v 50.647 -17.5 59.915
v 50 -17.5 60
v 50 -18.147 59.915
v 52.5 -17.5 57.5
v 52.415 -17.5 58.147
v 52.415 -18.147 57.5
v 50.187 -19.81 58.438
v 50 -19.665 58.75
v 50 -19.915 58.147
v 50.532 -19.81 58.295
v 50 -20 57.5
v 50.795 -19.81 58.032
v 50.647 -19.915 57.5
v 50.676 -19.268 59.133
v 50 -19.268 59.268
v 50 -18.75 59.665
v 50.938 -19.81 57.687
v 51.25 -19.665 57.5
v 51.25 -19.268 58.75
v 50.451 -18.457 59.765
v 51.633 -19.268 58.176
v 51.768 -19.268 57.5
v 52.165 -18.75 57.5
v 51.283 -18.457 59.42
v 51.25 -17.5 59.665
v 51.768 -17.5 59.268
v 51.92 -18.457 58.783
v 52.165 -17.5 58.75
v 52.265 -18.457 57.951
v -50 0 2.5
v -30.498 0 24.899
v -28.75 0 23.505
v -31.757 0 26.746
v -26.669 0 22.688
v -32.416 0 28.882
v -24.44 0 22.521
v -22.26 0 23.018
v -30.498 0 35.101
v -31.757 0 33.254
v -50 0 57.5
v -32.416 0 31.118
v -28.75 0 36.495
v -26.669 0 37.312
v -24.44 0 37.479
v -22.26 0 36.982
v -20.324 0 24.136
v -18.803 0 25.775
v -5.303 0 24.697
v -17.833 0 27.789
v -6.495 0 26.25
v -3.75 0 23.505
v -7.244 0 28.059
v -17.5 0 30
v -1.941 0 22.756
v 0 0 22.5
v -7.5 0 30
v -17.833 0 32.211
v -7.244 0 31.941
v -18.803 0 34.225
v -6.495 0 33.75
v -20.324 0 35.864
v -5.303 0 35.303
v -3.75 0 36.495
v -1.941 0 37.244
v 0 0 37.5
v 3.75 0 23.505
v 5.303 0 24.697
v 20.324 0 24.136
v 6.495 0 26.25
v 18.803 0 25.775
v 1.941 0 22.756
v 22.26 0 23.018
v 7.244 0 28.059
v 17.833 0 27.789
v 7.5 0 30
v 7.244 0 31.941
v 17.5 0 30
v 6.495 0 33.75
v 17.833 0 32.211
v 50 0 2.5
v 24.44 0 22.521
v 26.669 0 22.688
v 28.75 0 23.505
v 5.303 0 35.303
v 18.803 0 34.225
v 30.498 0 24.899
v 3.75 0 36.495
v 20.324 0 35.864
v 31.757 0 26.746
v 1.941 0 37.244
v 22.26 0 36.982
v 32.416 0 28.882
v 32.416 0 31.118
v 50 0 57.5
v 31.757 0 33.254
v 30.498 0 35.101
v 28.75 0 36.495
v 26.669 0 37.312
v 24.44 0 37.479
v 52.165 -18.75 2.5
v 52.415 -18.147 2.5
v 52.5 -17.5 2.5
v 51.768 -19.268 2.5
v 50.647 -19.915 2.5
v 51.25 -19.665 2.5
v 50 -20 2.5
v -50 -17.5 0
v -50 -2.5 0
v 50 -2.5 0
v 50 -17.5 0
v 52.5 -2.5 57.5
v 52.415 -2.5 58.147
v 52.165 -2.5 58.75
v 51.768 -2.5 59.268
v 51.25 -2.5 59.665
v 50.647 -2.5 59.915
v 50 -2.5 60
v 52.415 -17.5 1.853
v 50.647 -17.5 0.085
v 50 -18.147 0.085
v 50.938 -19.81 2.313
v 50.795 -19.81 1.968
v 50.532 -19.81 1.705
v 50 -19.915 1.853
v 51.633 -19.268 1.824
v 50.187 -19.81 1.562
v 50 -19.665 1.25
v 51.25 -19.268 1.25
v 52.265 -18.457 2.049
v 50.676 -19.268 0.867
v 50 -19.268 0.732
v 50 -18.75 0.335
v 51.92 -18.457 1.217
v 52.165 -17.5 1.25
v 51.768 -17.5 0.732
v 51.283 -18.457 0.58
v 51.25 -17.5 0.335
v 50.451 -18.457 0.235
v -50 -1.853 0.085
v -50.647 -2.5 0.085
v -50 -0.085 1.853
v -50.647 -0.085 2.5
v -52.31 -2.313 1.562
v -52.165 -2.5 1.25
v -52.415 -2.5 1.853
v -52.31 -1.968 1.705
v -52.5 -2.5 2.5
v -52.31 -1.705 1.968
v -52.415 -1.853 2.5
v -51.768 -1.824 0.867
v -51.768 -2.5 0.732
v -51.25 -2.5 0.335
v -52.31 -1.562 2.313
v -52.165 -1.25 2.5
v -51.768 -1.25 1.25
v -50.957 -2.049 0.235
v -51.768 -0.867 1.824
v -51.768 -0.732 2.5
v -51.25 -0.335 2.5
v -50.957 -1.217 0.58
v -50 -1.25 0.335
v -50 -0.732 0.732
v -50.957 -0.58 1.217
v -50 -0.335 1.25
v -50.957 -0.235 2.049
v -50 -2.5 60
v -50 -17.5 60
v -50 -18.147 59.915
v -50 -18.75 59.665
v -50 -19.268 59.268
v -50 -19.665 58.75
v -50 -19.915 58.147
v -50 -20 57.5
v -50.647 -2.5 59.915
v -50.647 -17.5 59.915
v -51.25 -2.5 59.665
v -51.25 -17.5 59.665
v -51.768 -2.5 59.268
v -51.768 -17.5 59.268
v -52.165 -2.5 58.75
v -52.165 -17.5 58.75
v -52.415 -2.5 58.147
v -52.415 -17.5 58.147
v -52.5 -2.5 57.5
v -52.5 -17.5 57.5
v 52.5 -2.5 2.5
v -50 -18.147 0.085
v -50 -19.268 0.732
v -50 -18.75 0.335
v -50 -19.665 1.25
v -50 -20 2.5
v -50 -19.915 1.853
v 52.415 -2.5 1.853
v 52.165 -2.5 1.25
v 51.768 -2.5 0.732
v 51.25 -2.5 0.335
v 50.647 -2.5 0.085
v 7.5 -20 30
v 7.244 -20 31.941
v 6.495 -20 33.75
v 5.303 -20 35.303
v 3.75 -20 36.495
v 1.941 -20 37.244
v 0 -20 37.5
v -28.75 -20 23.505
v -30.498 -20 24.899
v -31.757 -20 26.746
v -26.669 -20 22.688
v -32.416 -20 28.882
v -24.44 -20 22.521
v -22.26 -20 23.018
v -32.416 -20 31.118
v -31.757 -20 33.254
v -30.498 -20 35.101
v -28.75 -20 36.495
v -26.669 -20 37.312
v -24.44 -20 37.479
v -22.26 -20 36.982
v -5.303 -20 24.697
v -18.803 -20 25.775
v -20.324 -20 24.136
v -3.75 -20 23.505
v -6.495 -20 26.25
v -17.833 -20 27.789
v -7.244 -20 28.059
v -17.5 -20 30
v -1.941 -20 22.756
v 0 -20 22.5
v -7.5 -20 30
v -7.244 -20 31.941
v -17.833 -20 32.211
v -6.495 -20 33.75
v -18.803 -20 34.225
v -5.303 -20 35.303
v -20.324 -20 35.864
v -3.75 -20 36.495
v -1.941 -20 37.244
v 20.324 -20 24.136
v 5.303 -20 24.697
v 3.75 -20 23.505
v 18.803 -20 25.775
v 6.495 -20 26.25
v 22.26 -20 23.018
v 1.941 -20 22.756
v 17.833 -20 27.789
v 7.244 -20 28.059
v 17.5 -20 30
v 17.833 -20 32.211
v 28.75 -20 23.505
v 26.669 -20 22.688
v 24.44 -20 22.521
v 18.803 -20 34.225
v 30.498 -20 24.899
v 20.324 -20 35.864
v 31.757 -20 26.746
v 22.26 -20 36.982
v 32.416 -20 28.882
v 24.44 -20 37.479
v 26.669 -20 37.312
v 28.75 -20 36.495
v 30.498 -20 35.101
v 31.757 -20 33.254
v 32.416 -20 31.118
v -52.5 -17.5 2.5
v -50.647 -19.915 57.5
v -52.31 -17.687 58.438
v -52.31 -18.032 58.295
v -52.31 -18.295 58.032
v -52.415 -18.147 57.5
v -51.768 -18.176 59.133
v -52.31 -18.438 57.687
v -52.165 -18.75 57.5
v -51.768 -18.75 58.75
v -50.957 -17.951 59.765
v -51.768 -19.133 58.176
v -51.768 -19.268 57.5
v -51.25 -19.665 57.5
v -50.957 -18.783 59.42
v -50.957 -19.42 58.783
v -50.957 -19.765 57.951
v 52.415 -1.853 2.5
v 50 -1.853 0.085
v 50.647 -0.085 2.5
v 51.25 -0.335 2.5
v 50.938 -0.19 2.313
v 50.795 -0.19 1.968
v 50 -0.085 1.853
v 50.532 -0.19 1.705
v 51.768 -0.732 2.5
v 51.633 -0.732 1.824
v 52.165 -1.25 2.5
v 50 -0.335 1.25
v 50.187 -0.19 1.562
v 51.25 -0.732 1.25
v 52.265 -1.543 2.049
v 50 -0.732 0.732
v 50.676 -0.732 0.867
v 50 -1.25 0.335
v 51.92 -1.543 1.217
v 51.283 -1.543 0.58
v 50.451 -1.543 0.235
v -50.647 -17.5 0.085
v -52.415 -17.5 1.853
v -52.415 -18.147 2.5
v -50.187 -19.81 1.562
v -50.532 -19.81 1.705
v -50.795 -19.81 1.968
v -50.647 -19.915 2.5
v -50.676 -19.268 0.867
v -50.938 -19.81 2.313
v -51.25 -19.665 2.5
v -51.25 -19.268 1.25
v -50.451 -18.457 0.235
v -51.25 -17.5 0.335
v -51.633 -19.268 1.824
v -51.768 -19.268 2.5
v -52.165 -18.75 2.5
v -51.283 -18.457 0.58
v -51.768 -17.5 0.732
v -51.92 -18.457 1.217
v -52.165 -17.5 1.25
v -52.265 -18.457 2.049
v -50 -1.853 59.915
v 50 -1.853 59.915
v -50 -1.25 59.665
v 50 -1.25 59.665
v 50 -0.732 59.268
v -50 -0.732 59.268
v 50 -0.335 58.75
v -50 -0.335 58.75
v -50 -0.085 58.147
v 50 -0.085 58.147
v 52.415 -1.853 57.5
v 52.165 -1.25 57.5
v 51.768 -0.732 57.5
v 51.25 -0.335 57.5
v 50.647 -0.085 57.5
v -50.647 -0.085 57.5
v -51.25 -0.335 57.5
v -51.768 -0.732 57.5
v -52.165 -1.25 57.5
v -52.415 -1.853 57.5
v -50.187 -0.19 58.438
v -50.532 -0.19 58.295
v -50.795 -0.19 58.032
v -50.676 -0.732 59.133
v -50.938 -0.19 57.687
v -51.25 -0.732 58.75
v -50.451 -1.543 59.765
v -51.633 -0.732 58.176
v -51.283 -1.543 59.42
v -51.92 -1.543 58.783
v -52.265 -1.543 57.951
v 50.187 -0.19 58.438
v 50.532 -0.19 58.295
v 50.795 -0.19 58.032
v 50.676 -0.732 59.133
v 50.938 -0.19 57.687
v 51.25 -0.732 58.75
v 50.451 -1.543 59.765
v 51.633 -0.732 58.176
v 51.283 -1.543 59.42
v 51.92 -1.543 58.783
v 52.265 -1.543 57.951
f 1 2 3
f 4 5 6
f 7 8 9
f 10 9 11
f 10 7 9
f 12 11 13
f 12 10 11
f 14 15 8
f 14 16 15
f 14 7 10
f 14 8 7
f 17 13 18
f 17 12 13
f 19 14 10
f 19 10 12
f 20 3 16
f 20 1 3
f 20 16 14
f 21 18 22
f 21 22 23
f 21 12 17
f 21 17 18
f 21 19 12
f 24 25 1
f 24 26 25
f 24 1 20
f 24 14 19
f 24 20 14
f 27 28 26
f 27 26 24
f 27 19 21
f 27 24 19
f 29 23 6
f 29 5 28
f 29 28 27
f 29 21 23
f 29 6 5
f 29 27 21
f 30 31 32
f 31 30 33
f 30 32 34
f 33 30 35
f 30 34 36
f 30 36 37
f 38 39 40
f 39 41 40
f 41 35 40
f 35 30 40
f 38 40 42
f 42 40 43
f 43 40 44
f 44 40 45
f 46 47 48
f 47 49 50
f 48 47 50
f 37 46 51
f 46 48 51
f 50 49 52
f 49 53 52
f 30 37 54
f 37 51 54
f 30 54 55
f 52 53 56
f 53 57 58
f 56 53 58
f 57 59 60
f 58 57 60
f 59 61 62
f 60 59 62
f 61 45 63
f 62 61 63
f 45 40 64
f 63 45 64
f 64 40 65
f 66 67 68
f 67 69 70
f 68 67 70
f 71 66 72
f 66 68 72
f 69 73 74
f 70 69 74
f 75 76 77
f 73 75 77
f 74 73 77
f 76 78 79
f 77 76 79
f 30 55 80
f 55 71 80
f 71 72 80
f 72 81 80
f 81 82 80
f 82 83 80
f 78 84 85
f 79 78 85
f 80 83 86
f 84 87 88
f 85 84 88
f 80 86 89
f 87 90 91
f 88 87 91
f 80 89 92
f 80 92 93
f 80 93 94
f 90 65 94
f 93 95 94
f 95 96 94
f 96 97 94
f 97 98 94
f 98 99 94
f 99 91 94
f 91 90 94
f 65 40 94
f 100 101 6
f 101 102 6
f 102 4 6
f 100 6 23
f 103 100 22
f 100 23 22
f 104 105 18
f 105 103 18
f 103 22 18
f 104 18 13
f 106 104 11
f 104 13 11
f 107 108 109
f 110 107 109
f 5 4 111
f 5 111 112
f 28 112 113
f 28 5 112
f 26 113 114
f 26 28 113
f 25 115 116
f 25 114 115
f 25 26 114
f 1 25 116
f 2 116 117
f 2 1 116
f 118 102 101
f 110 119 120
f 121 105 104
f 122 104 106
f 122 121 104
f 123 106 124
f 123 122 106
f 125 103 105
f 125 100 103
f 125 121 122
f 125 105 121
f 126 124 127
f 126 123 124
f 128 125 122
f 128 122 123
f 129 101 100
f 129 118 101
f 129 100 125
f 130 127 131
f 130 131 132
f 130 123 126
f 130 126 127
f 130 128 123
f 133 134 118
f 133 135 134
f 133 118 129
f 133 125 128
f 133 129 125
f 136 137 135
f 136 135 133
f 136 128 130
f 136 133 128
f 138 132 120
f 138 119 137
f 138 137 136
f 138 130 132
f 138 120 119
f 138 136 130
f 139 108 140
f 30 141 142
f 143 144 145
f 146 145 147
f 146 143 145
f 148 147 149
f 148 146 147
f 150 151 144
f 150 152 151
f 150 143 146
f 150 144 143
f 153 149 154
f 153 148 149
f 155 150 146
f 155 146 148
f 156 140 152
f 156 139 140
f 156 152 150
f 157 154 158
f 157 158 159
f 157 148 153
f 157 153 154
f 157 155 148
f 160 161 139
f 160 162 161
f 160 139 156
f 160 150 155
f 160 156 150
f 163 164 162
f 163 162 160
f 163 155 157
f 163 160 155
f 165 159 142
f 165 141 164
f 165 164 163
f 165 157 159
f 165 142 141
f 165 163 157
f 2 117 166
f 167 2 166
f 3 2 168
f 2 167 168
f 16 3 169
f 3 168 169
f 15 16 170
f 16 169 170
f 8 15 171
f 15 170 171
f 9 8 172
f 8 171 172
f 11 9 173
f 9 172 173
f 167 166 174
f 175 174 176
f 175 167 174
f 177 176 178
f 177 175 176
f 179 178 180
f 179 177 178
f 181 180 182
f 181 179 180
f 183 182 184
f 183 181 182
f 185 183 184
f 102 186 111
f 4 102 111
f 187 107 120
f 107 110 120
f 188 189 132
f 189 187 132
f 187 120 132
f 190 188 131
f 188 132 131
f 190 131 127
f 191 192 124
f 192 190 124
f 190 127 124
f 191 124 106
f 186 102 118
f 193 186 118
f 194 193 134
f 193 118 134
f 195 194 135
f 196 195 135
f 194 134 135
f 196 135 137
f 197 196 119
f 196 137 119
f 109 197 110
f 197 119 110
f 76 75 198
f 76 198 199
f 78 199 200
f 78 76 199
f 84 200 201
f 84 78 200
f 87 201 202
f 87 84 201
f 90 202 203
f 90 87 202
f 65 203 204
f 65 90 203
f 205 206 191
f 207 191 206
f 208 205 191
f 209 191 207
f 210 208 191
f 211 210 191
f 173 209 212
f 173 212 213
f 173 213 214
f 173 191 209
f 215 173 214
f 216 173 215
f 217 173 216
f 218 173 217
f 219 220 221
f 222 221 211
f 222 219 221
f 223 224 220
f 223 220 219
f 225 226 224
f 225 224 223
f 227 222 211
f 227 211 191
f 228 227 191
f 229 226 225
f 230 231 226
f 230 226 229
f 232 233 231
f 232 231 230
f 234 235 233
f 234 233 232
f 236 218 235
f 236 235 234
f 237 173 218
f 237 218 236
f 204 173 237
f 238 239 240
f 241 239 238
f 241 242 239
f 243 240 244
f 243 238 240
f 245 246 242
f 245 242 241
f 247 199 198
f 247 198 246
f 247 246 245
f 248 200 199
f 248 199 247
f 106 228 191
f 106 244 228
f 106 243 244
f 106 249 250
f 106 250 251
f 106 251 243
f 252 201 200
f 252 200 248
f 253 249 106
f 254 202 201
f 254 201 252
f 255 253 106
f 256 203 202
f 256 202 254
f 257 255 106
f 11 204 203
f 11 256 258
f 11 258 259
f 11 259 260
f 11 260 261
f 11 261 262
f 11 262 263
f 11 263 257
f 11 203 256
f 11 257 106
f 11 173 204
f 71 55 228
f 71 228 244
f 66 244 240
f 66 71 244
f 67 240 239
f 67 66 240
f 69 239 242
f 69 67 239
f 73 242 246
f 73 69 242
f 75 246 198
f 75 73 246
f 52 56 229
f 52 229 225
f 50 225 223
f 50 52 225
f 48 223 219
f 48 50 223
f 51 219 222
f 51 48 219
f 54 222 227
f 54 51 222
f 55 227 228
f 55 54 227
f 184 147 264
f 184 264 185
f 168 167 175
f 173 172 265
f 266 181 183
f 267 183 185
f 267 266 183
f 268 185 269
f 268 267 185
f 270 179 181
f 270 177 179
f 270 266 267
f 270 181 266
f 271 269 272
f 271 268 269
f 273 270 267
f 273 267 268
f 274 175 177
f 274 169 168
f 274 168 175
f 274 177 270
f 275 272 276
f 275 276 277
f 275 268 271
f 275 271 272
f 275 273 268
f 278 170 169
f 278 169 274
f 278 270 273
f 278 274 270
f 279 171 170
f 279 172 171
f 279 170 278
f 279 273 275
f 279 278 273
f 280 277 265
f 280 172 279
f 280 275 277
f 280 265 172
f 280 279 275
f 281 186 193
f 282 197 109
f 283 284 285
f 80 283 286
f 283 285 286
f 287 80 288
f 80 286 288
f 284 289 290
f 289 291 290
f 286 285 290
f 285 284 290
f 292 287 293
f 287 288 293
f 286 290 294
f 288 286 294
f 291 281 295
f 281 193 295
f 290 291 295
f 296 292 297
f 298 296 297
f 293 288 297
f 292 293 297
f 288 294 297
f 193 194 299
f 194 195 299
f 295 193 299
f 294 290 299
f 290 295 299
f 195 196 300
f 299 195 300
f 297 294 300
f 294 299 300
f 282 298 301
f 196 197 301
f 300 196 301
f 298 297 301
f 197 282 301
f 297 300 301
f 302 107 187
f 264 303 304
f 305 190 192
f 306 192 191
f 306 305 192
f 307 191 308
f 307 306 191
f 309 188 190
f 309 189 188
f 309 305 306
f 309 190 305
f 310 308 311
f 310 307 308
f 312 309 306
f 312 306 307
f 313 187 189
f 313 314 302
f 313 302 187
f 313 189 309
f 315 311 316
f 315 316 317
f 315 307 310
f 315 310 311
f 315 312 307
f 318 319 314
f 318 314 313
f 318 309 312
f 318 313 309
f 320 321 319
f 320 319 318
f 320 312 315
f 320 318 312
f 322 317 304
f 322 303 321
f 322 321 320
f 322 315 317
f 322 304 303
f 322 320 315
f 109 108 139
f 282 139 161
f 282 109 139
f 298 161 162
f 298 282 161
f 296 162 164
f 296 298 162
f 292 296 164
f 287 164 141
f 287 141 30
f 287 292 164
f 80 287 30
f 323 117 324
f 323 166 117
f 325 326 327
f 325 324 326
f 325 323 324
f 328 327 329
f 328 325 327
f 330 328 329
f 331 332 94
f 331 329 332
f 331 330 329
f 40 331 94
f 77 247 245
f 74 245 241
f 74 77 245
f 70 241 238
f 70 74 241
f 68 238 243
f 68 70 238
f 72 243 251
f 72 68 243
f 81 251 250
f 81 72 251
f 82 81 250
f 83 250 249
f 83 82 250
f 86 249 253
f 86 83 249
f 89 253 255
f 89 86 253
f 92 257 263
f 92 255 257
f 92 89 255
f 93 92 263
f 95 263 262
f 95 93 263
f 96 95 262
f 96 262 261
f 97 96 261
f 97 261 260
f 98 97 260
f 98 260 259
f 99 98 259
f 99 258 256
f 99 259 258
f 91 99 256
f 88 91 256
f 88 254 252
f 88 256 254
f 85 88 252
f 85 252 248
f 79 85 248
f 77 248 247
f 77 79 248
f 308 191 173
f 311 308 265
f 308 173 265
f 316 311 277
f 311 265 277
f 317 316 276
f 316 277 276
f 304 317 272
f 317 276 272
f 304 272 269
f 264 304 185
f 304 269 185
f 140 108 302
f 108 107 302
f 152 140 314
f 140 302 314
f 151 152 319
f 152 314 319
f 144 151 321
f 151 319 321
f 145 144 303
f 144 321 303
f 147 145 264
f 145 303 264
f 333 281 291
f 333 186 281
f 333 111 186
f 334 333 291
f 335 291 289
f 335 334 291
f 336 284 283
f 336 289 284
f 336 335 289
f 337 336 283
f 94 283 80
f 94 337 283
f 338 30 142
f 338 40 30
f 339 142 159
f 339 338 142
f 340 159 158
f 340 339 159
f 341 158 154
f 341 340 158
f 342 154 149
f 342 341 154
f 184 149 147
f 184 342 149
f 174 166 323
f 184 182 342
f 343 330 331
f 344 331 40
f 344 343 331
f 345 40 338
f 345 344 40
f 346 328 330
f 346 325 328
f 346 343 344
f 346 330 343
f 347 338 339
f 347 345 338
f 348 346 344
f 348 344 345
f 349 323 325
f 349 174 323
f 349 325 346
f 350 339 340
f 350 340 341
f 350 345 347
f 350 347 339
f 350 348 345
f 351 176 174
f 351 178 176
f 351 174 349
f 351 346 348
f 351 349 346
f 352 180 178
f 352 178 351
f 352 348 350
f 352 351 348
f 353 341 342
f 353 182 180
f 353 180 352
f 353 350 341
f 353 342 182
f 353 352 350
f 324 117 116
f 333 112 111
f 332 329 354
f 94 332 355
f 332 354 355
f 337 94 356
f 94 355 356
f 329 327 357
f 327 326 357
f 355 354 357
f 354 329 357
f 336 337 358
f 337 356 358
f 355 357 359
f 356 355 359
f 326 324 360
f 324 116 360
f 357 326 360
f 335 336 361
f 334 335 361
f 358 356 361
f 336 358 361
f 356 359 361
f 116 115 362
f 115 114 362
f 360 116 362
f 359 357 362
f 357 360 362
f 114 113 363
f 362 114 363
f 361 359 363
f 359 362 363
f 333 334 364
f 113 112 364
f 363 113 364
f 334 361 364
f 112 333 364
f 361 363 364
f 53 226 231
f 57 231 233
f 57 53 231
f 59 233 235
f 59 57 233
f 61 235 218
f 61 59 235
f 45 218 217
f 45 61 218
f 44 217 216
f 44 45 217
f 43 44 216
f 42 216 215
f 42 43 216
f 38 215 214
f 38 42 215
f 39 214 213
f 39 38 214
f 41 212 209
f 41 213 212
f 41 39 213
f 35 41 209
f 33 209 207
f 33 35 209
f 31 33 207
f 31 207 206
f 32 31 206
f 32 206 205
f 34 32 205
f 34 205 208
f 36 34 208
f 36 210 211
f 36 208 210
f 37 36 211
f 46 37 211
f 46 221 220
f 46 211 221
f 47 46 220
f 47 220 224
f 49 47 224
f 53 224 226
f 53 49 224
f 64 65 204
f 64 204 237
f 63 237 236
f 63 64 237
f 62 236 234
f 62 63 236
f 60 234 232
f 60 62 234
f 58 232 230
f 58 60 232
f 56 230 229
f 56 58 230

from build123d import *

# Parameters (mm, degrees)
F0_W     = 52.5
F0_H     = 60
F1_DEPTH = 20
F3_DEPTH = 25
F4_R     = 2.5


with BuildPart() as f1:
    # F0 (on Front) → F1 (new body)
    with BuildSketch(Plane.XZ):
        with Locations((26.25, 30)):
            Rectangle(F0_W, F0_H)
        with Locations((-26.25, 30)):
            Rectangle(F0_W, F0_H)
    extrude(amount=F1_DEPTH)

    # F2 (on Front) → F3 (cut)
    with BuildSketch(Plane.XZ):
        with BuildLine():
            ThreePointArc((7.5, 30), (5.303301, 35.303301), (0, 37.5))
            Line((0, 37.5), (0, 30))
            Line((0, 30), (7.5, 30))
        make_face()
        with BuildLine():
            ThreePointArc((32.5, 30), (25, 37.5), (17.5, 30))
            Line((17.5, 30), (25, 30))
            Line((25, 30), (32.5, 30))
        make_face()
        with BuildLine():
            Line((25, 30), (17.5, 30))
            ThreePointArc((17.5, 30), (25, 22.5), (32.5, 30))
            Line((32.5, 30), (25, 30))
        make_face()
        with BuildLine():
            ThreePointArc((-32.5, 30), (-25, 22.5), (-17.5, 30))
            Line((-17.5, 30), (-25, 30))
            Line((-25, 30), (-32.5, 30))
        make_face()
        with BuildLine():
            Line((-25, 30), (-17.5, 30))
            ThreePointArc((-17.5, 30), (-25, 37.5), (-32.5, 30))
            Line((-32.5, 30), (-25, 30))
        make_face()
        with BuildLine():
            Line((0, 30), (0, 37.5))
            ThreePointArc((0, 37.5), (-5.303301, 35.303301), (-7.5, 30))
            Line((-7.5, 30), (0, 30))
        make_face()
        with BuildLine():
            Line((7.5, 30), (0, 30))
            Line((0, 30), (0, 22.5))
            ThreePointArc((0, 22.5), (5.303301, 24.696699), (7.5, 30))
        make_face()
        with BuildLine():
            Line((0, 22.5), (0, 30))
            Line((0, 30), (-7.5, 30))
            ThreePointArc((-7.5, 30), (-5.303301, 24.696699), (0, 22.5))
        make_face()
    extrude(amount=F3_DEPTH, mode=Mode.SUBTRACT)

    # F4
    f4_edges = [f1.edges().sort_by_distance(p)[0] for p in [
        (52.5, -10, 60),
        (0, -20, 60),
        (-52.5, -10, 60),
        (0, 0, 60),
        (52.5, -10, 0),
        (52.5, 0, 30),
        (52.5, -20, 30),
        (0, 0, 0),
        (-52.5, -10, 0),
        (0, -20, 0),
        (-52.5, 0, 30),
        (-52.5, -20, 30),
    ]]
    fillet(f4_edges, radius=F4_R)


solid = f1.part
